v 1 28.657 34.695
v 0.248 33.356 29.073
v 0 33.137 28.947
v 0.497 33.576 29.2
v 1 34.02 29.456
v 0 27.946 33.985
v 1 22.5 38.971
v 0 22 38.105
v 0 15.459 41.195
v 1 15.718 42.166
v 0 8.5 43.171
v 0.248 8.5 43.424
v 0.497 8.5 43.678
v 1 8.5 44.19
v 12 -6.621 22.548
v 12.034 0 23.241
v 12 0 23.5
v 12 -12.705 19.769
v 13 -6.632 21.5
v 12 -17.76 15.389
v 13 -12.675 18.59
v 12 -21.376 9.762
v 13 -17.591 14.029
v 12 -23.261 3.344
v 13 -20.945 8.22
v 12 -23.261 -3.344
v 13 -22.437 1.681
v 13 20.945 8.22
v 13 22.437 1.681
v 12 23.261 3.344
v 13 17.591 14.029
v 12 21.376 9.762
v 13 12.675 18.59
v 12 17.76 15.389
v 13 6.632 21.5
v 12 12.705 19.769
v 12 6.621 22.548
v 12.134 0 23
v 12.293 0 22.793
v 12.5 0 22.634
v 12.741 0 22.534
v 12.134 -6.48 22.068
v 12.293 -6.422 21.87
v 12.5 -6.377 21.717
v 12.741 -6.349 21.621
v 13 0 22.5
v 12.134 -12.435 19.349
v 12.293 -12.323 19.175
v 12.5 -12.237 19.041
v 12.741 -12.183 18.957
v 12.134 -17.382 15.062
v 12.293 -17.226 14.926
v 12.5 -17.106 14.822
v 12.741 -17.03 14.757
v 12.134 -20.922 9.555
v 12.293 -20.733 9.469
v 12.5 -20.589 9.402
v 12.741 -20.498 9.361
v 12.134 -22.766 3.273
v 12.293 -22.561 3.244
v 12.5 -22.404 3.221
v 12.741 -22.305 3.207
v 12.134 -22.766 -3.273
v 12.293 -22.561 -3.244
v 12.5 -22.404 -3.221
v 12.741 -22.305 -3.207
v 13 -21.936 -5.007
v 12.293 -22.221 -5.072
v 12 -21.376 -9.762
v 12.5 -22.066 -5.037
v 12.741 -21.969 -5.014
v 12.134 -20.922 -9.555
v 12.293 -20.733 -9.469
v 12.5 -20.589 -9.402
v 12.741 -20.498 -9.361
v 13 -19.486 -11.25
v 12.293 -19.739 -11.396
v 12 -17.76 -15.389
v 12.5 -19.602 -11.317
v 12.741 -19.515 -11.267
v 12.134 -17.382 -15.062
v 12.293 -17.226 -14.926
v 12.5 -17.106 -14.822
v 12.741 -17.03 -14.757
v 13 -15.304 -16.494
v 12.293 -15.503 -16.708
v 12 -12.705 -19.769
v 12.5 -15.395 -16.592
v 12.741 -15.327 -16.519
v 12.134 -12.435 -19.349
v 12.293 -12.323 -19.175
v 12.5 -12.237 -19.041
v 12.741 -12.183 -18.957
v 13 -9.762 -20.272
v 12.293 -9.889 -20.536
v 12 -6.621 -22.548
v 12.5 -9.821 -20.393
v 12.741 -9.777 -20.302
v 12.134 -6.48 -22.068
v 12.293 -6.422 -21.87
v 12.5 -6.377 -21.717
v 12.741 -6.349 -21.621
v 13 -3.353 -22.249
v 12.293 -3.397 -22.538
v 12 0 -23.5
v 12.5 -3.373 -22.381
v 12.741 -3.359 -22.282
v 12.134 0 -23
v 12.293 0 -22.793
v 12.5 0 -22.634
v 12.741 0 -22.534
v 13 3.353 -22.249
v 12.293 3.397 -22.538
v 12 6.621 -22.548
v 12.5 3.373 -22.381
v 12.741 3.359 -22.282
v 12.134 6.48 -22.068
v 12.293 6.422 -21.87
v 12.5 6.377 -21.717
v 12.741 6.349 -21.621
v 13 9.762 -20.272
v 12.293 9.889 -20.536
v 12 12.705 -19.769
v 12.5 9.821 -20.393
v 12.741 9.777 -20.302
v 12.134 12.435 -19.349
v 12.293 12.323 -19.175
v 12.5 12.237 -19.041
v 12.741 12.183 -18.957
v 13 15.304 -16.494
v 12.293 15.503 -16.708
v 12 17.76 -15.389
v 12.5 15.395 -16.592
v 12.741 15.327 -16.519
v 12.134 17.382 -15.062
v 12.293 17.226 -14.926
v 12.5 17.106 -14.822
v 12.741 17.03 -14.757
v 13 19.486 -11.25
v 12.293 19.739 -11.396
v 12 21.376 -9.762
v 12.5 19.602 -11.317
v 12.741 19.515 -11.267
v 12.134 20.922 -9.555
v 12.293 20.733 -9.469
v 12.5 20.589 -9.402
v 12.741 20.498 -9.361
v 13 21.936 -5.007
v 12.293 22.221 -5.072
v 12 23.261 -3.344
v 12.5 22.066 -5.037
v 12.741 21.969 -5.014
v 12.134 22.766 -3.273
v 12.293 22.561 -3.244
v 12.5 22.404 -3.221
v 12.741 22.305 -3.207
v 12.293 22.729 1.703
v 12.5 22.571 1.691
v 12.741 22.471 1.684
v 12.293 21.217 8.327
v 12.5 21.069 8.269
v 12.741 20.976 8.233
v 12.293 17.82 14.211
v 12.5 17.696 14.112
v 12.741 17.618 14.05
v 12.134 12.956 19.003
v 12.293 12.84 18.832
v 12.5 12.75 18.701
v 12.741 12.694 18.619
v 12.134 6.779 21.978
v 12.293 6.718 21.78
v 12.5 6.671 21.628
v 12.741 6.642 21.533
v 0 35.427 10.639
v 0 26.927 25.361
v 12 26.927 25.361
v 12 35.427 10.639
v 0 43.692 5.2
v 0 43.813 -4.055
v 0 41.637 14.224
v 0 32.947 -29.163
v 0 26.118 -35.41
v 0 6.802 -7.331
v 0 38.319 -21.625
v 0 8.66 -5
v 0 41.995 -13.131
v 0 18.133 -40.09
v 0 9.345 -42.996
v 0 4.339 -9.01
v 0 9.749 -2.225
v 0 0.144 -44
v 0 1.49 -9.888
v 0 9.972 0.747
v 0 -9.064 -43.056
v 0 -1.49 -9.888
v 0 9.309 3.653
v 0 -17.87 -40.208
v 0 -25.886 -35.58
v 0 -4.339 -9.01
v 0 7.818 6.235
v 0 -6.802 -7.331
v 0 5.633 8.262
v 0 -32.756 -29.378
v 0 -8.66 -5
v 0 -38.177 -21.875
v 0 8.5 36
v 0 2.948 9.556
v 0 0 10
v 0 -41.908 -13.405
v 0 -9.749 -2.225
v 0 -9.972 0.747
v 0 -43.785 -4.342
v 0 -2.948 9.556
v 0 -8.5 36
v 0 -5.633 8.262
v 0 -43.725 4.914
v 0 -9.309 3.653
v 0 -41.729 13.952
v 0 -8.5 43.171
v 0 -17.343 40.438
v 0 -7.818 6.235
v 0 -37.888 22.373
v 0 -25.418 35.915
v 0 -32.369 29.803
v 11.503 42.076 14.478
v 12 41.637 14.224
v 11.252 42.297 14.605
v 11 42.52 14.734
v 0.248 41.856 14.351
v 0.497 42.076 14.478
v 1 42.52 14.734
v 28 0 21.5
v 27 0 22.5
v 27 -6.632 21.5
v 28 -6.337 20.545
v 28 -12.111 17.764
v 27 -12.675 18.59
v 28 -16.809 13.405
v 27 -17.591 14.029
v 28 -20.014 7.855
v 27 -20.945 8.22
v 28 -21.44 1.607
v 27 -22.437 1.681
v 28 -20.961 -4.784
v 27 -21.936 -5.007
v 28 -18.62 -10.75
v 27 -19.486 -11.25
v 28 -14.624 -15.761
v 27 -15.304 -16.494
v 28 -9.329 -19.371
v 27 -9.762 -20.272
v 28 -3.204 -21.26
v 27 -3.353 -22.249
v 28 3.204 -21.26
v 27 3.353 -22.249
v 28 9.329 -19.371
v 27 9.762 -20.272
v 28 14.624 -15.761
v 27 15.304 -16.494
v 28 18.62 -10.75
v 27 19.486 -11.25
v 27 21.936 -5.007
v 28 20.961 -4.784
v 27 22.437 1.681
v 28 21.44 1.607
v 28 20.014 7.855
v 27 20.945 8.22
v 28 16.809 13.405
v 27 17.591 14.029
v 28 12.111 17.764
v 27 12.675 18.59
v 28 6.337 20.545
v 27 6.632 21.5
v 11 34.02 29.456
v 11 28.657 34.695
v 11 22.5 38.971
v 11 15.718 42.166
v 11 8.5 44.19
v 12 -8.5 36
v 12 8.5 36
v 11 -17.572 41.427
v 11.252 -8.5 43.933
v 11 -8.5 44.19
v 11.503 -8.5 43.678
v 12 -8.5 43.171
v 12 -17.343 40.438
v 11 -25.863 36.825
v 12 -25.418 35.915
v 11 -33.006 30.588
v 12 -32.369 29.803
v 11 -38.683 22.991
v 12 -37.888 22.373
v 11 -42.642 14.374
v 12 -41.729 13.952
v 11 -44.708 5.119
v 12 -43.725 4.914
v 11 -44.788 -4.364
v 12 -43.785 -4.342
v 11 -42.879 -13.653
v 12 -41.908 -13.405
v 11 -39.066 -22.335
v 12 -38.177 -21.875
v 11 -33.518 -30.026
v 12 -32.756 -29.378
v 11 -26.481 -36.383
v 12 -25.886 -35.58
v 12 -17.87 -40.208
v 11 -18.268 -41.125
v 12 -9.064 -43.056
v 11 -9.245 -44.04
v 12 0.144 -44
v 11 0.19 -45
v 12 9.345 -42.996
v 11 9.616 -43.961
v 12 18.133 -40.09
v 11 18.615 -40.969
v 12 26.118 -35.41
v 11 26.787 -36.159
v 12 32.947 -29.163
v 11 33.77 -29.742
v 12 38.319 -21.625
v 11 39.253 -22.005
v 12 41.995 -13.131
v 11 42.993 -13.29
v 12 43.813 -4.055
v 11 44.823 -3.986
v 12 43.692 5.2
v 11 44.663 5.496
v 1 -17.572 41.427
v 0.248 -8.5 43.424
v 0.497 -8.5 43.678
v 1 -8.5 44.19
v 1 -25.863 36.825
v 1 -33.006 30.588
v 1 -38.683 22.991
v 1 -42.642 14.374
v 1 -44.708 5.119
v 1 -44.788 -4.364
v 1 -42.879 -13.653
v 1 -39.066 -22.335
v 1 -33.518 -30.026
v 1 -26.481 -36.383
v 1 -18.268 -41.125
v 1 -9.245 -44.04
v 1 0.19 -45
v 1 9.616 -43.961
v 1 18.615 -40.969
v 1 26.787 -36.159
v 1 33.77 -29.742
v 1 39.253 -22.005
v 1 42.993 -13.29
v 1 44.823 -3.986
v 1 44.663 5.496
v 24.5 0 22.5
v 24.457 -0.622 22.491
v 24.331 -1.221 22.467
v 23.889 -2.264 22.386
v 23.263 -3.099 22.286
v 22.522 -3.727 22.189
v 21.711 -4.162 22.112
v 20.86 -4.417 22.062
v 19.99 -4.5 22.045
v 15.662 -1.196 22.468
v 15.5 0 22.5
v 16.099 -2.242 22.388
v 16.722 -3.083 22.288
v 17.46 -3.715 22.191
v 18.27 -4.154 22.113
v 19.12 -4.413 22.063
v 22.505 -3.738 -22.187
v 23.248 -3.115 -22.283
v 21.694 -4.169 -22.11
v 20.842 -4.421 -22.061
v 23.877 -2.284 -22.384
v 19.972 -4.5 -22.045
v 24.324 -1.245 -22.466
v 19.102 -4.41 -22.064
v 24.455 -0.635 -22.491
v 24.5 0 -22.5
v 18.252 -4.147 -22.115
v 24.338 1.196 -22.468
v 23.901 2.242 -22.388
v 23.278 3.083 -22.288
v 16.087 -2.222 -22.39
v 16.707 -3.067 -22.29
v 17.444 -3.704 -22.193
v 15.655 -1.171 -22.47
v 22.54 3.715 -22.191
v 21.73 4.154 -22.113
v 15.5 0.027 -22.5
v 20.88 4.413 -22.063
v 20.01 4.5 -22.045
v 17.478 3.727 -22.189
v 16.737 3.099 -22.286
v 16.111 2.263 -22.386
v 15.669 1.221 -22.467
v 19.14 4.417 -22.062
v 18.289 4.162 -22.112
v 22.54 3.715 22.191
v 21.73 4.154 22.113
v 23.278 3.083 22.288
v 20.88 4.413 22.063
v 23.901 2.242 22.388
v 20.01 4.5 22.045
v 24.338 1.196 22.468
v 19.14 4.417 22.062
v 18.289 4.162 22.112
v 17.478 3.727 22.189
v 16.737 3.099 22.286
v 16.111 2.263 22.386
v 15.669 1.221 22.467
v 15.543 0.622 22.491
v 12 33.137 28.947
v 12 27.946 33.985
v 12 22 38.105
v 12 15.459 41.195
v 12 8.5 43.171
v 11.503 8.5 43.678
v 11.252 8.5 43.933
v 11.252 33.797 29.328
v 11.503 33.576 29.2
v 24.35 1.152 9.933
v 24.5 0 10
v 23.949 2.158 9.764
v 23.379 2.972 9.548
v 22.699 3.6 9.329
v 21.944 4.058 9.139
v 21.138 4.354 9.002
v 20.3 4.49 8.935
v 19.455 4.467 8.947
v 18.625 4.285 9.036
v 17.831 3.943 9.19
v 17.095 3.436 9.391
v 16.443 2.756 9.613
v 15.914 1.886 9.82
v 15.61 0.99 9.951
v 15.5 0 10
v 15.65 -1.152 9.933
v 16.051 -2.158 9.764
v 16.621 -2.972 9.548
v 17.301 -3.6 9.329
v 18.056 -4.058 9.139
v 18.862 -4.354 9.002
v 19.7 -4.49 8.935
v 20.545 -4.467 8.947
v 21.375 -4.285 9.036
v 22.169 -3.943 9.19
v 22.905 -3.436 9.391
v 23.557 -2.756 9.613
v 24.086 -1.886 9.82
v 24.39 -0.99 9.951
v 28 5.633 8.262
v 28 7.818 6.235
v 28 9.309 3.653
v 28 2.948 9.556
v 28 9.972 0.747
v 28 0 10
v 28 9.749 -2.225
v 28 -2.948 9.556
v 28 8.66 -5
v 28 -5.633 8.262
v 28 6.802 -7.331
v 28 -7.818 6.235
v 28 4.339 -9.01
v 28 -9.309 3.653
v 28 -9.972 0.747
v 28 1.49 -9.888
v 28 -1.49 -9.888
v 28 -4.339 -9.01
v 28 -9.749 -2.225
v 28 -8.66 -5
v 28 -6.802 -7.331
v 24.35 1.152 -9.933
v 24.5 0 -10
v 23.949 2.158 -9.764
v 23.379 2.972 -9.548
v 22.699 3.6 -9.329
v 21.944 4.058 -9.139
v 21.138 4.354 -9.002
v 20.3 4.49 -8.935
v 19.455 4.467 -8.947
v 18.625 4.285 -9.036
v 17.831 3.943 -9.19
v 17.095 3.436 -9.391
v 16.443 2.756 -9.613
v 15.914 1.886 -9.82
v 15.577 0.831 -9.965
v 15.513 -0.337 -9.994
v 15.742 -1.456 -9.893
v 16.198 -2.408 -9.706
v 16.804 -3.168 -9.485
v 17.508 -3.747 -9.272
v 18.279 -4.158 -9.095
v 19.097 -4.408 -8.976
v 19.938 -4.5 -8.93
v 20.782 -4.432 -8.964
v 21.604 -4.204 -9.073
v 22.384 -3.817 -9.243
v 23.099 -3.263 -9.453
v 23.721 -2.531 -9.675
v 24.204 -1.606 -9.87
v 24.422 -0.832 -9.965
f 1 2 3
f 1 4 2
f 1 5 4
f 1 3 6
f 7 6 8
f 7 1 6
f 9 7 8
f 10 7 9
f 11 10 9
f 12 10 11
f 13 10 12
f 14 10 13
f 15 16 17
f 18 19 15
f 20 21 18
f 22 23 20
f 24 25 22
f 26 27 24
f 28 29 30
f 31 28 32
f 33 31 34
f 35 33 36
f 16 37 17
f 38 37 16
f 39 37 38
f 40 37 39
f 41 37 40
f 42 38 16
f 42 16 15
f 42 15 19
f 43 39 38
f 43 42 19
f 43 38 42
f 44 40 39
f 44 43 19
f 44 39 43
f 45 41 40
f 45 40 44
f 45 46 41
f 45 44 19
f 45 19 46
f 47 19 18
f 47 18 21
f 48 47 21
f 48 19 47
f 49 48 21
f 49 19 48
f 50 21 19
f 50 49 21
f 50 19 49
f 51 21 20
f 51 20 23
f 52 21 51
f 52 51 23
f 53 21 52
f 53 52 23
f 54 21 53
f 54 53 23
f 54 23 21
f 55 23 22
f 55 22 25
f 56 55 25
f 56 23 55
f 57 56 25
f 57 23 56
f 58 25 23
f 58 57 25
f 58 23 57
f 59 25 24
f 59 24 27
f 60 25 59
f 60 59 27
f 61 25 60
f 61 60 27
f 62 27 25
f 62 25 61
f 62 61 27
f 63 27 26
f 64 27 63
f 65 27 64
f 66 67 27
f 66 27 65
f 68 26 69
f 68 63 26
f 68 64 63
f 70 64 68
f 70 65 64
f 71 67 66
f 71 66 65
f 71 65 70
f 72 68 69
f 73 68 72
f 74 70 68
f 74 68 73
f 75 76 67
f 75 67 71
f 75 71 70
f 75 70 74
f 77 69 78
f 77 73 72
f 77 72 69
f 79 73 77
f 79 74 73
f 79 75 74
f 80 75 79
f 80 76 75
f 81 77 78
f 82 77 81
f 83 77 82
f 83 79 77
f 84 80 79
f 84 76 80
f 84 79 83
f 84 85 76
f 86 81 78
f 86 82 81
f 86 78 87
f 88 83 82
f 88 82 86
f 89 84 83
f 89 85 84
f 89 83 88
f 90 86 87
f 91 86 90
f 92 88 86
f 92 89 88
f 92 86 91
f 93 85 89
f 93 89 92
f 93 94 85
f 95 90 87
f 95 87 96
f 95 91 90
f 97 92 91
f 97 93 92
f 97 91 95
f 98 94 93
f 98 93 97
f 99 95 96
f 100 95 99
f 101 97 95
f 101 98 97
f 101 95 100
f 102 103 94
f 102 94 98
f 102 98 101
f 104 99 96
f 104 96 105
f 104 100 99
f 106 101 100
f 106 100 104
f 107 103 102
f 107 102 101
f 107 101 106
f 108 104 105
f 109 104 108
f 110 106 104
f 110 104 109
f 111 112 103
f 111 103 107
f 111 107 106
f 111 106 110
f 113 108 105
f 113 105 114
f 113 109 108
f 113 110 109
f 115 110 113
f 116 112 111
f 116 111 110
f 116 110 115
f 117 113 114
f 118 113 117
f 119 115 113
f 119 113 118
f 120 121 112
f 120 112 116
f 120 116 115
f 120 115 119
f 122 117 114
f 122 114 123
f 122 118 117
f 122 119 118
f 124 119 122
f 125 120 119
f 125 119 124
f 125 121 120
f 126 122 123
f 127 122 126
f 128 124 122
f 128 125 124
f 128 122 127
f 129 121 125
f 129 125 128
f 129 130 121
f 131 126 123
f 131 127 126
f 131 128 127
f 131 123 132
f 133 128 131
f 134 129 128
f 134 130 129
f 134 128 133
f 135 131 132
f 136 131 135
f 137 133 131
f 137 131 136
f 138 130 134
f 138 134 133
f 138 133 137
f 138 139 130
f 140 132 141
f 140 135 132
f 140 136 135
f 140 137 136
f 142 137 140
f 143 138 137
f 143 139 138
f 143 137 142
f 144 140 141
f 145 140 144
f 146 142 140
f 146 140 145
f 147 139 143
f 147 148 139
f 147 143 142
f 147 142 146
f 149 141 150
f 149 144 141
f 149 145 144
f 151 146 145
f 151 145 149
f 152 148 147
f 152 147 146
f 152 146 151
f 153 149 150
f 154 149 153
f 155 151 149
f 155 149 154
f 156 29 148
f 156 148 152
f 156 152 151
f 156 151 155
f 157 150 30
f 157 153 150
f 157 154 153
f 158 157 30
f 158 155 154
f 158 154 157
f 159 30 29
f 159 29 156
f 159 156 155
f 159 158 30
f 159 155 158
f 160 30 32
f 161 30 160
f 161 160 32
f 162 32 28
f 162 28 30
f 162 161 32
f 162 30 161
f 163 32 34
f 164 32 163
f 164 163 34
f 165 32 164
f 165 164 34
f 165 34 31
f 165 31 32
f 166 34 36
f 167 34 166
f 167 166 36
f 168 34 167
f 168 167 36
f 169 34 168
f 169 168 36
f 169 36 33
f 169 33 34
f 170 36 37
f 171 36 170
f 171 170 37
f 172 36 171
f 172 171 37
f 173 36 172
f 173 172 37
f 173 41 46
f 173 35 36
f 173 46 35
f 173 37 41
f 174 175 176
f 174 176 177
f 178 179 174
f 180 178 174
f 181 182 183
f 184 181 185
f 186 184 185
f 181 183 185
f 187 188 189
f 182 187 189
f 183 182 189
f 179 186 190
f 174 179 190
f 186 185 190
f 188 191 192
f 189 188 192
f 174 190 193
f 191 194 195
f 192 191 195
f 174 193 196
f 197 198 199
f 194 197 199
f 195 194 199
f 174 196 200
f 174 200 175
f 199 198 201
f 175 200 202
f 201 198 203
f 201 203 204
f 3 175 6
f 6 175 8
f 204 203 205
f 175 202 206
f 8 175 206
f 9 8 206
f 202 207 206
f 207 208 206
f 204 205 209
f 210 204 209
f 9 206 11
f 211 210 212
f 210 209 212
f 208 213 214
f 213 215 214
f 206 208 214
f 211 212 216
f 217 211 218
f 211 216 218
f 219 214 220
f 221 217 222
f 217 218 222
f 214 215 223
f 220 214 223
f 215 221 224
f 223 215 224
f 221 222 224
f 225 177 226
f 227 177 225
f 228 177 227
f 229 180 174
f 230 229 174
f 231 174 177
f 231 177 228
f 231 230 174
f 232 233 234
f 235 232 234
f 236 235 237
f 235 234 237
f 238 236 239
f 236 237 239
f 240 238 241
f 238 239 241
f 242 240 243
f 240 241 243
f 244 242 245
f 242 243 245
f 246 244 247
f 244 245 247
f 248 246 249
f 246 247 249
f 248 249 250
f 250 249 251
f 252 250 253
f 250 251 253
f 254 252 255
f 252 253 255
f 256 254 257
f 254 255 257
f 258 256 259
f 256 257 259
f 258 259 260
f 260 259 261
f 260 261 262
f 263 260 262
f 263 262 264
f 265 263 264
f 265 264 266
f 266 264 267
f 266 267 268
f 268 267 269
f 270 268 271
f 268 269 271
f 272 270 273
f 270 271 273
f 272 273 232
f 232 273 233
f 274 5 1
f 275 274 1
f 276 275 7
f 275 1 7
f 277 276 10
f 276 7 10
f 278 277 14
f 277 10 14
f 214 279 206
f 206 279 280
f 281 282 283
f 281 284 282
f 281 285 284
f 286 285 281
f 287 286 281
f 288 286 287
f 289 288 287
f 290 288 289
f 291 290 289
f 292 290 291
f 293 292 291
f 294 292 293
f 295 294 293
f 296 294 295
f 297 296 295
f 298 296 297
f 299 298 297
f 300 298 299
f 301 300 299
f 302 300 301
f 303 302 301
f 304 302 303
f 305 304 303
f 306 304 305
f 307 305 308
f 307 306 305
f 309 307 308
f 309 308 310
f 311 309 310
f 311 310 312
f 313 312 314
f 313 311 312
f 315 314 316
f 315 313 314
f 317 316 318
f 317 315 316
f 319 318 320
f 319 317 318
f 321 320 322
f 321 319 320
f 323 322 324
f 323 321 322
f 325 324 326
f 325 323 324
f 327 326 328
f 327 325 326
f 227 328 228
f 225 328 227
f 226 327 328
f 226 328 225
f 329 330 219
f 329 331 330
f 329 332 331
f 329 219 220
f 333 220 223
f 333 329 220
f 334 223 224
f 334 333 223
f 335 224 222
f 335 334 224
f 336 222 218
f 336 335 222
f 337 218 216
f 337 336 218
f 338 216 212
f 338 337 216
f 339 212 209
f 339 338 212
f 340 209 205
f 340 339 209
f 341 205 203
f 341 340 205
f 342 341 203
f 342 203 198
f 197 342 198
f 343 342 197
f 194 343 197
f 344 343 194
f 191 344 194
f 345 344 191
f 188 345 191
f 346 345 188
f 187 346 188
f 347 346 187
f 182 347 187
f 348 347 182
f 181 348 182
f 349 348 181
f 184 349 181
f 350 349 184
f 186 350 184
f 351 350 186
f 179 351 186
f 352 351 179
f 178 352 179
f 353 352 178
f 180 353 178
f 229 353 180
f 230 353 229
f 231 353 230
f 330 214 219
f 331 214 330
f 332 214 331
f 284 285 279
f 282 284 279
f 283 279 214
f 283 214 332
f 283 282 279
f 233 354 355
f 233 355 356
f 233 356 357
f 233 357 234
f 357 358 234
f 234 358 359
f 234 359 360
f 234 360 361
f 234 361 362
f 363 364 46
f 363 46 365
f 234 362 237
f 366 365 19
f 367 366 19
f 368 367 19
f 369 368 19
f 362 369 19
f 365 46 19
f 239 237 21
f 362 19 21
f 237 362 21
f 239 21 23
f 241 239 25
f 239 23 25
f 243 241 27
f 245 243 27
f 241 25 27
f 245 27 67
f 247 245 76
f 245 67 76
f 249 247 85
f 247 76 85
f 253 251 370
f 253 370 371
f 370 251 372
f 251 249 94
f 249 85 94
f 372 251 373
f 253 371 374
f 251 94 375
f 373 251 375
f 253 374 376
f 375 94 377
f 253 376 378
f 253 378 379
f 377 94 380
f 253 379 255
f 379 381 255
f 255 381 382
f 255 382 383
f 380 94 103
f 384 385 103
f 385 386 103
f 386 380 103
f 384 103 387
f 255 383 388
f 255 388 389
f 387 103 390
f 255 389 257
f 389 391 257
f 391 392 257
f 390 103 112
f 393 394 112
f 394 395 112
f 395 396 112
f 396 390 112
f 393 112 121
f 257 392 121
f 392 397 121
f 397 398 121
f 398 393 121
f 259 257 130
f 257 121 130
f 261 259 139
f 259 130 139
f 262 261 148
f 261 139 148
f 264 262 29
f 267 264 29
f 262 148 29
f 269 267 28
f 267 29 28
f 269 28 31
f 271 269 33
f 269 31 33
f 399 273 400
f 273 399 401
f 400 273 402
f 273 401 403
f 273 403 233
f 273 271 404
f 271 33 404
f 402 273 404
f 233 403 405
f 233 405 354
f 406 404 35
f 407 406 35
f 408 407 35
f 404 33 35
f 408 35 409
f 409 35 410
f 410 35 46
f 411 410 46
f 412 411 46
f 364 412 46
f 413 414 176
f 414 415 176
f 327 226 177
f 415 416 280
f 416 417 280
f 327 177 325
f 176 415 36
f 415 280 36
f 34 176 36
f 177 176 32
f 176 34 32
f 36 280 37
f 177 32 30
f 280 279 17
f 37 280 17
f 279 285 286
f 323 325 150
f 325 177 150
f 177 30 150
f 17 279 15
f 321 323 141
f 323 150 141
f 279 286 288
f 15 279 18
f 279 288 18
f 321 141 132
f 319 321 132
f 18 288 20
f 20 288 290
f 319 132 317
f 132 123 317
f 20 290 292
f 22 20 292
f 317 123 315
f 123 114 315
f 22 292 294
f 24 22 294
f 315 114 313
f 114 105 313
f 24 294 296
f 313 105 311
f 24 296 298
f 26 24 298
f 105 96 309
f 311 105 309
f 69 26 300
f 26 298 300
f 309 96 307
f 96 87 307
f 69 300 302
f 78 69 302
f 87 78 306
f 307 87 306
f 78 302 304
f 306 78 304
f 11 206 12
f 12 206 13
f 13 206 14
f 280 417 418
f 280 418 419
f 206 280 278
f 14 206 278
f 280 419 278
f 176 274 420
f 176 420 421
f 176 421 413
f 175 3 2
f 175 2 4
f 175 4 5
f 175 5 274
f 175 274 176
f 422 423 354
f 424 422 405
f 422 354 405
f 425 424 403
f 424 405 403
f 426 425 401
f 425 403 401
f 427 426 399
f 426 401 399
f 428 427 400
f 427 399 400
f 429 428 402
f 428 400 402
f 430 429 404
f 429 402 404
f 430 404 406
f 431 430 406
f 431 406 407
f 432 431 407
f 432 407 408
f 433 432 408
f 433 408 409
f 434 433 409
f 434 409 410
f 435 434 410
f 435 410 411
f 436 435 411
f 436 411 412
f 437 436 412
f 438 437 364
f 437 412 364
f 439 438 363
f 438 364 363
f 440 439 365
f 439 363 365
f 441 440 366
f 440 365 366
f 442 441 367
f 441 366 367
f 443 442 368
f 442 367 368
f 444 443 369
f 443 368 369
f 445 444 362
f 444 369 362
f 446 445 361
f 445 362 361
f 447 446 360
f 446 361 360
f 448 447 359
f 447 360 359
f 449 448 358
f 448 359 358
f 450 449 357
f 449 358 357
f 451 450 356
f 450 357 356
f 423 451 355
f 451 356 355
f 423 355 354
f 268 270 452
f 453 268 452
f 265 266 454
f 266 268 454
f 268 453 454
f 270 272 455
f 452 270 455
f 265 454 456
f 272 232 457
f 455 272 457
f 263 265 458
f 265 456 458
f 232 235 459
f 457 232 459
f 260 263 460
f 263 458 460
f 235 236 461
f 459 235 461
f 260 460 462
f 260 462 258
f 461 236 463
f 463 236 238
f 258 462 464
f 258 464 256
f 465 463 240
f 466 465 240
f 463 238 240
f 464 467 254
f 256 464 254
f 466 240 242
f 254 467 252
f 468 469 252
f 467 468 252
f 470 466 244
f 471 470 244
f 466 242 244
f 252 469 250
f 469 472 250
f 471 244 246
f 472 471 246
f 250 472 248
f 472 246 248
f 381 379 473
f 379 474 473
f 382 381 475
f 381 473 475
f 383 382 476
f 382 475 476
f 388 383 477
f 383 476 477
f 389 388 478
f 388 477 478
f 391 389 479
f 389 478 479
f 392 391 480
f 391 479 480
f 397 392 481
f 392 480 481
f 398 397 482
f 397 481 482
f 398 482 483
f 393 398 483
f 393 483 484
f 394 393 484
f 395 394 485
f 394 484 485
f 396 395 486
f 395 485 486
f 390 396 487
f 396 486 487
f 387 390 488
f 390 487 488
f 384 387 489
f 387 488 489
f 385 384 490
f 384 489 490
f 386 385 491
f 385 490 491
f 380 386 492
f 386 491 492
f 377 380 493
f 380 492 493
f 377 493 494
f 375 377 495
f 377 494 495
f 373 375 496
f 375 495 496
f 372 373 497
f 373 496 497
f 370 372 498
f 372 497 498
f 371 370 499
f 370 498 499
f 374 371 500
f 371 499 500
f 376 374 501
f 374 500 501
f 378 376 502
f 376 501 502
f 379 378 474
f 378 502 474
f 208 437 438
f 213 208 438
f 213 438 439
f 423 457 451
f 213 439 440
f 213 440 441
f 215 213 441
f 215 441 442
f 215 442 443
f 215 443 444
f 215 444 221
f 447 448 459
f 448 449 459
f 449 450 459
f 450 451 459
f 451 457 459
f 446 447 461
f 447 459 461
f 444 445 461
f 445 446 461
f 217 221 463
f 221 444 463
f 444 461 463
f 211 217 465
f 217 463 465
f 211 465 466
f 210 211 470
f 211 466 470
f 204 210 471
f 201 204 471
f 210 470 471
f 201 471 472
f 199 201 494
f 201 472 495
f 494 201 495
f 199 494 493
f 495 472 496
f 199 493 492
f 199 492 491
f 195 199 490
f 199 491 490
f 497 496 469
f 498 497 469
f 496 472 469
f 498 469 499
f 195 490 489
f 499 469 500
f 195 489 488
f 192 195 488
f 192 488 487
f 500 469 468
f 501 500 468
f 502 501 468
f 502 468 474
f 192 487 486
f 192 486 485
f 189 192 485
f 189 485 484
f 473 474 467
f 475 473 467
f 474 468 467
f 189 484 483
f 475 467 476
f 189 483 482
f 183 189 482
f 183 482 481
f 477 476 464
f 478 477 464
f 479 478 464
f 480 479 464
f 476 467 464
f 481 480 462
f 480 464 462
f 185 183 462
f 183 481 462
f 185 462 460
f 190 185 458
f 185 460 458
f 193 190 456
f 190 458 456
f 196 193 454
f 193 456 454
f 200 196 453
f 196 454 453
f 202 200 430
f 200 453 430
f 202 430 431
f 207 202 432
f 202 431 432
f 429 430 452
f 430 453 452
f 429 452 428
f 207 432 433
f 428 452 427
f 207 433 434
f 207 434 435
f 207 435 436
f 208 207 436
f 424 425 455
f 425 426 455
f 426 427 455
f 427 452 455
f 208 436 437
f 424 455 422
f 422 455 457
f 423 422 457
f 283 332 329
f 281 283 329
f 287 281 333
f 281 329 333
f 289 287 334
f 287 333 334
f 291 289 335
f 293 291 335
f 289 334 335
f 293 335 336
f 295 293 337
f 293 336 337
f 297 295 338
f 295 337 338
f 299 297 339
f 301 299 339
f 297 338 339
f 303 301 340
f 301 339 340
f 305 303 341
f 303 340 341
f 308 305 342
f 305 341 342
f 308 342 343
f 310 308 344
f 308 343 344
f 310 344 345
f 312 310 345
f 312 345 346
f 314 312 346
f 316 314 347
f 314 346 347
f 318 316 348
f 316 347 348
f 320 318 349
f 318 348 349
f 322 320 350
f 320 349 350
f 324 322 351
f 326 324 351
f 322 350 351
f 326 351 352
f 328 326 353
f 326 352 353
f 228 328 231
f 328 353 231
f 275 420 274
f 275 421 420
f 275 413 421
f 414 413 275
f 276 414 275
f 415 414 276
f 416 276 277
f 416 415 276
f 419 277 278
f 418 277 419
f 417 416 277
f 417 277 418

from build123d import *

# Parameters (mm, degrees)
F3_R     = 4.5
F4_DEPTH = 25
F5_W     = 17
F5_H     = 14
F6_DEPTH = 25
F8_DEPTH = 25
F9_SIZE  = 1
F10_R    = 1


with BuildPart() as f2:
    # F0 (on Front) → F2 (revolve)
    with BuildSketch(Plane.XZ):
        Polygon((0, 45), (0, 10), (28, 10), (28, 22.5), (12, 22.5), (12, 45), align=None)
    revolve(axis=Axis((18.0693501607, 0, 0), (1, 0, 0)))

    # F3 (on Top) → F4 (cut, symmetric)
    with BuildSketch(Plane.XY):
        with Locations((20, 0)):
            Circle(F3_R)
    extrude(amount=F4_DEPTH, both=True, mode=Mode.SUBTRACT)

    # F5 (on face) → F6 (cut)
    with BuildSketch(Plane.YZ.offset(12)):
        with Locations((0, 43)):
            Rectangle(F5_W, F5_H)
    extrude(amount=-F6_DEPTH, mode=Mode.SUBTRACT)

    # F7 (on Right) → F8 (cut)
    with BuildSketch(Plane.YZ):
        Polygon((26.9269145362, 25.3612159322), (31.1769145362, 18), (40.5253827808, 23.3973406575), (36.2753827808, 30.7585565897), align=None)
        Polygon((40.5253827808, 23.3973406575), (31.1769145362, 18), (35.4269145362, 10.6387840678), (44.7753827808, 16.0361247254), align=None)
    extrude(amount=F8_DEPTH, mode=Mode.SUBTRACT)

    # F9
    f9_edges = [f2.edges().sort_by_distance(p)[0] for p in [
        (28, 0, -22.5),
        (12, 22.5, 38.971143),
        (0, 22.5, 38.971143),
        (0, -22.5, -38.971143),
        (12, -22.5, -38.971143),
    ]]
    chamfer(f9_edges, length=F9_SIZE)

    # F10
    f10_edges = [f2.edges().sort_by_distance(p)[0] for p in [
        (12, 0, -22.5),
    ]]
    fillet(f10_edges, radius=F10_R)


solid = f2.part
